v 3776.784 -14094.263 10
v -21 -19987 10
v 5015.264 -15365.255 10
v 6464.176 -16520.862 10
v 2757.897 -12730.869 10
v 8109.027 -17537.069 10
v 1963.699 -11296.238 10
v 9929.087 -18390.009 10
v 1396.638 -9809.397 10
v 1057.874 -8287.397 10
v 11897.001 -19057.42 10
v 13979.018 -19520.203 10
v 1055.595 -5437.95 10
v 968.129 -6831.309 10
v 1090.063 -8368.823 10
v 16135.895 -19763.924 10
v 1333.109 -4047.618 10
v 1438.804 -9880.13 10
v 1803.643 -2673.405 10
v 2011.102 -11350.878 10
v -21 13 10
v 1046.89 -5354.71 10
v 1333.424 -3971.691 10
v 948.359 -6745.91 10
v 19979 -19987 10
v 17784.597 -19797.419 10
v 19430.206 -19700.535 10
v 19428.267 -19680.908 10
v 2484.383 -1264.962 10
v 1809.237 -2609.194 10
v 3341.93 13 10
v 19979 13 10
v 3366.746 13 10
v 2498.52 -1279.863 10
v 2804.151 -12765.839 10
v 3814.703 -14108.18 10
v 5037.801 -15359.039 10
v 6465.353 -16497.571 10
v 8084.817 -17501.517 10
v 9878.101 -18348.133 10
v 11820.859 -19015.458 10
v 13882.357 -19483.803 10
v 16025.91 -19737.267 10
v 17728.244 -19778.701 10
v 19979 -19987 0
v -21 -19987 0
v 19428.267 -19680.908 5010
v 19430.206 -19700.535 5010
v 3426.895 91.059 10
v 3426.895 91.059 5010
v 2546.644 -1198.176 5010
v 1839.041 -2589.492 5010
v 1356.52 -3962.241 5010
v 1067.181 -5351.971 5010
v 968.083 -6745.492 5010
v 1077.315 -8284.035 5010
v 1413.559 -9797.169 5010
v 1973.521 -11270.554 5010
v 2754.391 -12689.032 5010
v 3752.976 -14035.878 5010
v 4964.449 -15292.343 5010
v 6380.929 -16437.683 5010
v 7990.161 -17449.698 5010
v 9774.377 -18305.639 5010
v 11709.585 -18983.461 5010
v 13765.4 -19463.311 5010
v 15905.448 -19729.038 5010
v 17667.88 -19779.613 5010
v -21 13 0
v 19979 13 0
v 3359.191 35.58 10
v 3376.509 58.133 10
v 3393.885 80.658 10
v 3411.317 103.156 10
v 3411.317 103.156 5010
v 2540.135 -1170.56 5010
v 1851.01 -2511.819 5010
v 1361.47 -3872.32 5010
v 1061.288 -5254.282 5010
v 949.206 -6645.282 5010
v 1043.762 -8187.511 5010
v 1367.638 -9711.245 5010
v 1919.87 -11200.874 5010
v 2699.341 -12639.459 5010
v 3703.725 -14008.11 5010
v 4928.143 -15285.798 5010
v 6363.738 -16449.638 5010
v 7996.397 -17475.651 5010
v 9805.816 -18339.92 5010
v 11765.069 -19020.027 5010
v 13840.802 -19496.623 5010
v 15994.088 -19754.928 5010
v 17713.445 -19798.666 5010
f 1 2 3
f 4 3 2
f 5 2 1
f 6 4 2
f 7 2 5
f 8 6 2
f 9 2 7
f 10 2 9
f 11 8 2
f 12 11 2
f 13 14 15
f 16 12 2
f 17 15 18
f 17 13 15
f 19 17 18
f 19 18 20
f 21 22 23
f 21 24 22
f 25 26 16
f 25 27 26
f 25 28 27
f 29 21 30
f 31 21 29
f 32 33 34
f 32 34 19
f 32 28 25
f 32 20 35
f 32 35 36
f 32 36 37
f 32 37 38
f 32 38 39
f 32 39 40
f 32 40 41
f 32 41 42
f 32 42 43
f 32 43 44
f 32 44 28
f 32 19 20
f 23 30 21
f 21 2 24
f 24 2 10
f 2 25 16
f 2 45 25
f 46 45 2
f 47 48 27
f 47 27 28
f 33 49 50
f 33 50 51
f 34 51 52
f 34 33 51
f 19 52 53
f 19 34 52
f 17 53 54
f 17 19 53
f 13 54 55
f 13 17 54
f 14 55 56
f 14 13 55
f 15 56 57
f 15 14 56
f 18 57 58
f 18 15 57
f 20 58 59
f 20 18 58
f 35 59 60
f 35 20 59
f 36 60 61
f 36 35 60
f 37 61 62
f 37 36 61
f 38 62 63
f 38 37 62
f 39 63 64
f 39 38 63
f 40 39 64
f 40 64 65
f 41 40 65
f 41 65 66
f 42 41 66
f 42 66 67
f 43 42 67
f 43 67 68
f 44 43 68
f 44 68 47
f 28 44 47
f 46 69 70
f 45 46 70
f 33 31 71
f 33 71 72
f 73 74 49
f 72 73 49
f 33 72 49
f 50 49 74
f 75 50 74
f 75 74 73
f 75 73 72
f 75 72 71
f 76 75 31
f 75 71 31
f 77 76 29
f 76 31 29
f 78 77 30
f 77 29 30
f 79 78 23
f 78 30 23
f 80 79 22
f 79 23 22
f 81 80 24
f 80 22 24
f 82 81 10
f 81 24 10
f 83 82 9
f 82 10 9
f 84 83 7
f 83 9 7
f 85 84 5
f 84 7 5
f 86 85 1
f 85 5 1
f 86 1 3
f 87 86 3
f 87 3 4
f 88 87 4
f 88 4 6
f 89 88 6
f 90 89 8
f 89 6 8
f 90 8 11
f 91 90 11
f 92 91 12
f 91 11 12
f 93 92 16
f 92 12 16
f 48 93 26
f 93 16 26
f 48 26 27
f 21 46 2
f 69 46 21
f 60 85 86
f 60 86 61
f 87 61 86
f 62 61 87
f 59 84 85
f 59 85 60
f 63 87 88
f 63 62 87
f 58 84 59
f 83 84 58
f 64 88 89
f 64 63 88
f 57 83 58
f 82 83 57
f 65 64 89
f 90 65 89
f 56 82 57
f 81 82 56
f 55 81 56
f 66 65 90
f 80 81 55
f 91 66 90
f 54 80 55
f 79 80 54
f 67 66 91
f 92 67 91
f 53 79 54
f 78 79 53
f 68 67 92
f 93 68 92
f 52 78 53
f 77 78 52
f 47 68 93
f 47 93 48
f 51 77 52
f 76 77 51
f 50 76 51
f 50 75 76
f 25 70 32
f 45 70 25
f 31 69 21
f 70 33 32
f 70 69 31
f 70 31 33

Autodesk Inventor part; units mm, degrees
ref_plane "YZ Plane" through (0, 0, 0) normal (1, 0, 0) x (0, 1, 0)
ref_plane "XZ Plane" through (0, 0, 0) normal (0, 1, 0) x (-1, 0, 0)
sketch "Sketch1" plane through (0, 0, 0) normal (0, 0, 1) x (1, 0, 0)
  line L0 (-21, 13) -> (19979, 13)
  line L1 (19979, 13) -> (19979, -19987)
  line L2 (19979, -19987) -> (-21, -19987)
  line L3 (-21, -19987) -> (-21, 13)
  point P0 (0, 0)
  dimension "d0" = 20000
  dimension "d1" = 20000
extrude "Extrusion1" add sketch "Sketch1" along normal blind 10
sketch "Sketch3" plane through (0, 0, 10) normal (0, 0, 1) x (1, 0, 0)
  ellipse E0 centre (17474, -6711) end of major axis (949, -6904) minor radius 13089.7498 (3411.3173, 103.156) -> (19430.2058, -19700.5351) ccw
  line L0 (19491, -21143) -> (18773, -4107) construction
  line L1 (18773, -4107) -> (949, 778) construction
  line L2 (19430.2058, -19700.5351) -> (19428.267, -19680.9077)
  line L3 (3426.8947, 91.0588) -> (3411.3173, 103.156)
  spline S0 degree 5 poles (3426.8946, 91.0588) (3289.3305, -86.0799) (3155.5628, -266.1669) (3025.7448, -449.1474) (2582.6919, -1104.0004) (2192.609, -1792.9681) (1942.9072, -2302.662) (1514.5607, -3335.0424) (1219.6209, -4412.9944) (1108.6438, -4952.5138) (958.6777, -6038.7686) (952.3967, -7135.2681) (985.4333, -7680.7934) (1124.2205, -8773.4072) (1403.7291, -9838.831) (1579.2157, -10366.0927) (2003.0073, -11414.8396) (2552.3715, -12403.7993) (2862.1011, -12889.7087) (3552.2085, -13845.9501) (4345.5597, -14718.6835) (4775.5864, -15142.4306) (5700.1065, -15962.859) (6703.5469, -16684.8881) (7235.0599, -17028.5381) (8351.5895, -17677.3566) (9523.7658, -18219.4788) (10133.8388, -18468.5046) (11392.1439, -18918.5596) (12684.8119, -19257.7929) (13347.2554, -19401.6344) (14691.7872, -19635.0677) (16051.0972, -19755.979) (16737.5023, -19788.5174) (17688.8854, -19794.4714) (18638.3769, -19746.2443) (18902.0275, -19728.6554) (19165.3544, -19706.8781) (19428.267, -19680.9077) knots 0 0 0 0 0 0 0.034325 0.034325 0.034325 0.120975 0.120975 0.120975 0.205036 0.205036 0.205036 0.288433 0.288433 0.288433 0.373249 0.373249 0.373249 0.461235 0.461235 0.461235 0.553458 0.553458 0.553458 0.650175 0.650175 0.650175 0.75089 0.75089 0.75089 0.854514 0.854514 0.854514 0.959566 0.959566 0.959566 1 1 1 1 1 1
  point P0 (0, 0)
  dimension "d6" = 19.7229
extrude "Extrusion3" add sketch "Sketch3" along normal blind 5000
ref_plane "Work Plane1" through (19428.267, -19680.9077, 5010) normal (0.7773315, 0.6290912, 0) x (0, 0, -1)
sketch "Sketch4" plane through (19428.267, -19680.9077, 5010) normal (0.7773315, 0.6290912, 0) x (0, 0, -1)
  line L0 (-4491.9999, 841.2222) -> (-4491.9999, 20653.222) construction
  line L1 (-4491.9999, 20653.222) -> (5414, 20653.222) construction
  line L2 (5414, 20653.222) -> (5414, 841.2222) construction
  line L3 (5414, 841.2222) -> (-4491.9999, 841.2222) construction
  point P0 (5010, 27520.7414)
properties part number "baraca"
